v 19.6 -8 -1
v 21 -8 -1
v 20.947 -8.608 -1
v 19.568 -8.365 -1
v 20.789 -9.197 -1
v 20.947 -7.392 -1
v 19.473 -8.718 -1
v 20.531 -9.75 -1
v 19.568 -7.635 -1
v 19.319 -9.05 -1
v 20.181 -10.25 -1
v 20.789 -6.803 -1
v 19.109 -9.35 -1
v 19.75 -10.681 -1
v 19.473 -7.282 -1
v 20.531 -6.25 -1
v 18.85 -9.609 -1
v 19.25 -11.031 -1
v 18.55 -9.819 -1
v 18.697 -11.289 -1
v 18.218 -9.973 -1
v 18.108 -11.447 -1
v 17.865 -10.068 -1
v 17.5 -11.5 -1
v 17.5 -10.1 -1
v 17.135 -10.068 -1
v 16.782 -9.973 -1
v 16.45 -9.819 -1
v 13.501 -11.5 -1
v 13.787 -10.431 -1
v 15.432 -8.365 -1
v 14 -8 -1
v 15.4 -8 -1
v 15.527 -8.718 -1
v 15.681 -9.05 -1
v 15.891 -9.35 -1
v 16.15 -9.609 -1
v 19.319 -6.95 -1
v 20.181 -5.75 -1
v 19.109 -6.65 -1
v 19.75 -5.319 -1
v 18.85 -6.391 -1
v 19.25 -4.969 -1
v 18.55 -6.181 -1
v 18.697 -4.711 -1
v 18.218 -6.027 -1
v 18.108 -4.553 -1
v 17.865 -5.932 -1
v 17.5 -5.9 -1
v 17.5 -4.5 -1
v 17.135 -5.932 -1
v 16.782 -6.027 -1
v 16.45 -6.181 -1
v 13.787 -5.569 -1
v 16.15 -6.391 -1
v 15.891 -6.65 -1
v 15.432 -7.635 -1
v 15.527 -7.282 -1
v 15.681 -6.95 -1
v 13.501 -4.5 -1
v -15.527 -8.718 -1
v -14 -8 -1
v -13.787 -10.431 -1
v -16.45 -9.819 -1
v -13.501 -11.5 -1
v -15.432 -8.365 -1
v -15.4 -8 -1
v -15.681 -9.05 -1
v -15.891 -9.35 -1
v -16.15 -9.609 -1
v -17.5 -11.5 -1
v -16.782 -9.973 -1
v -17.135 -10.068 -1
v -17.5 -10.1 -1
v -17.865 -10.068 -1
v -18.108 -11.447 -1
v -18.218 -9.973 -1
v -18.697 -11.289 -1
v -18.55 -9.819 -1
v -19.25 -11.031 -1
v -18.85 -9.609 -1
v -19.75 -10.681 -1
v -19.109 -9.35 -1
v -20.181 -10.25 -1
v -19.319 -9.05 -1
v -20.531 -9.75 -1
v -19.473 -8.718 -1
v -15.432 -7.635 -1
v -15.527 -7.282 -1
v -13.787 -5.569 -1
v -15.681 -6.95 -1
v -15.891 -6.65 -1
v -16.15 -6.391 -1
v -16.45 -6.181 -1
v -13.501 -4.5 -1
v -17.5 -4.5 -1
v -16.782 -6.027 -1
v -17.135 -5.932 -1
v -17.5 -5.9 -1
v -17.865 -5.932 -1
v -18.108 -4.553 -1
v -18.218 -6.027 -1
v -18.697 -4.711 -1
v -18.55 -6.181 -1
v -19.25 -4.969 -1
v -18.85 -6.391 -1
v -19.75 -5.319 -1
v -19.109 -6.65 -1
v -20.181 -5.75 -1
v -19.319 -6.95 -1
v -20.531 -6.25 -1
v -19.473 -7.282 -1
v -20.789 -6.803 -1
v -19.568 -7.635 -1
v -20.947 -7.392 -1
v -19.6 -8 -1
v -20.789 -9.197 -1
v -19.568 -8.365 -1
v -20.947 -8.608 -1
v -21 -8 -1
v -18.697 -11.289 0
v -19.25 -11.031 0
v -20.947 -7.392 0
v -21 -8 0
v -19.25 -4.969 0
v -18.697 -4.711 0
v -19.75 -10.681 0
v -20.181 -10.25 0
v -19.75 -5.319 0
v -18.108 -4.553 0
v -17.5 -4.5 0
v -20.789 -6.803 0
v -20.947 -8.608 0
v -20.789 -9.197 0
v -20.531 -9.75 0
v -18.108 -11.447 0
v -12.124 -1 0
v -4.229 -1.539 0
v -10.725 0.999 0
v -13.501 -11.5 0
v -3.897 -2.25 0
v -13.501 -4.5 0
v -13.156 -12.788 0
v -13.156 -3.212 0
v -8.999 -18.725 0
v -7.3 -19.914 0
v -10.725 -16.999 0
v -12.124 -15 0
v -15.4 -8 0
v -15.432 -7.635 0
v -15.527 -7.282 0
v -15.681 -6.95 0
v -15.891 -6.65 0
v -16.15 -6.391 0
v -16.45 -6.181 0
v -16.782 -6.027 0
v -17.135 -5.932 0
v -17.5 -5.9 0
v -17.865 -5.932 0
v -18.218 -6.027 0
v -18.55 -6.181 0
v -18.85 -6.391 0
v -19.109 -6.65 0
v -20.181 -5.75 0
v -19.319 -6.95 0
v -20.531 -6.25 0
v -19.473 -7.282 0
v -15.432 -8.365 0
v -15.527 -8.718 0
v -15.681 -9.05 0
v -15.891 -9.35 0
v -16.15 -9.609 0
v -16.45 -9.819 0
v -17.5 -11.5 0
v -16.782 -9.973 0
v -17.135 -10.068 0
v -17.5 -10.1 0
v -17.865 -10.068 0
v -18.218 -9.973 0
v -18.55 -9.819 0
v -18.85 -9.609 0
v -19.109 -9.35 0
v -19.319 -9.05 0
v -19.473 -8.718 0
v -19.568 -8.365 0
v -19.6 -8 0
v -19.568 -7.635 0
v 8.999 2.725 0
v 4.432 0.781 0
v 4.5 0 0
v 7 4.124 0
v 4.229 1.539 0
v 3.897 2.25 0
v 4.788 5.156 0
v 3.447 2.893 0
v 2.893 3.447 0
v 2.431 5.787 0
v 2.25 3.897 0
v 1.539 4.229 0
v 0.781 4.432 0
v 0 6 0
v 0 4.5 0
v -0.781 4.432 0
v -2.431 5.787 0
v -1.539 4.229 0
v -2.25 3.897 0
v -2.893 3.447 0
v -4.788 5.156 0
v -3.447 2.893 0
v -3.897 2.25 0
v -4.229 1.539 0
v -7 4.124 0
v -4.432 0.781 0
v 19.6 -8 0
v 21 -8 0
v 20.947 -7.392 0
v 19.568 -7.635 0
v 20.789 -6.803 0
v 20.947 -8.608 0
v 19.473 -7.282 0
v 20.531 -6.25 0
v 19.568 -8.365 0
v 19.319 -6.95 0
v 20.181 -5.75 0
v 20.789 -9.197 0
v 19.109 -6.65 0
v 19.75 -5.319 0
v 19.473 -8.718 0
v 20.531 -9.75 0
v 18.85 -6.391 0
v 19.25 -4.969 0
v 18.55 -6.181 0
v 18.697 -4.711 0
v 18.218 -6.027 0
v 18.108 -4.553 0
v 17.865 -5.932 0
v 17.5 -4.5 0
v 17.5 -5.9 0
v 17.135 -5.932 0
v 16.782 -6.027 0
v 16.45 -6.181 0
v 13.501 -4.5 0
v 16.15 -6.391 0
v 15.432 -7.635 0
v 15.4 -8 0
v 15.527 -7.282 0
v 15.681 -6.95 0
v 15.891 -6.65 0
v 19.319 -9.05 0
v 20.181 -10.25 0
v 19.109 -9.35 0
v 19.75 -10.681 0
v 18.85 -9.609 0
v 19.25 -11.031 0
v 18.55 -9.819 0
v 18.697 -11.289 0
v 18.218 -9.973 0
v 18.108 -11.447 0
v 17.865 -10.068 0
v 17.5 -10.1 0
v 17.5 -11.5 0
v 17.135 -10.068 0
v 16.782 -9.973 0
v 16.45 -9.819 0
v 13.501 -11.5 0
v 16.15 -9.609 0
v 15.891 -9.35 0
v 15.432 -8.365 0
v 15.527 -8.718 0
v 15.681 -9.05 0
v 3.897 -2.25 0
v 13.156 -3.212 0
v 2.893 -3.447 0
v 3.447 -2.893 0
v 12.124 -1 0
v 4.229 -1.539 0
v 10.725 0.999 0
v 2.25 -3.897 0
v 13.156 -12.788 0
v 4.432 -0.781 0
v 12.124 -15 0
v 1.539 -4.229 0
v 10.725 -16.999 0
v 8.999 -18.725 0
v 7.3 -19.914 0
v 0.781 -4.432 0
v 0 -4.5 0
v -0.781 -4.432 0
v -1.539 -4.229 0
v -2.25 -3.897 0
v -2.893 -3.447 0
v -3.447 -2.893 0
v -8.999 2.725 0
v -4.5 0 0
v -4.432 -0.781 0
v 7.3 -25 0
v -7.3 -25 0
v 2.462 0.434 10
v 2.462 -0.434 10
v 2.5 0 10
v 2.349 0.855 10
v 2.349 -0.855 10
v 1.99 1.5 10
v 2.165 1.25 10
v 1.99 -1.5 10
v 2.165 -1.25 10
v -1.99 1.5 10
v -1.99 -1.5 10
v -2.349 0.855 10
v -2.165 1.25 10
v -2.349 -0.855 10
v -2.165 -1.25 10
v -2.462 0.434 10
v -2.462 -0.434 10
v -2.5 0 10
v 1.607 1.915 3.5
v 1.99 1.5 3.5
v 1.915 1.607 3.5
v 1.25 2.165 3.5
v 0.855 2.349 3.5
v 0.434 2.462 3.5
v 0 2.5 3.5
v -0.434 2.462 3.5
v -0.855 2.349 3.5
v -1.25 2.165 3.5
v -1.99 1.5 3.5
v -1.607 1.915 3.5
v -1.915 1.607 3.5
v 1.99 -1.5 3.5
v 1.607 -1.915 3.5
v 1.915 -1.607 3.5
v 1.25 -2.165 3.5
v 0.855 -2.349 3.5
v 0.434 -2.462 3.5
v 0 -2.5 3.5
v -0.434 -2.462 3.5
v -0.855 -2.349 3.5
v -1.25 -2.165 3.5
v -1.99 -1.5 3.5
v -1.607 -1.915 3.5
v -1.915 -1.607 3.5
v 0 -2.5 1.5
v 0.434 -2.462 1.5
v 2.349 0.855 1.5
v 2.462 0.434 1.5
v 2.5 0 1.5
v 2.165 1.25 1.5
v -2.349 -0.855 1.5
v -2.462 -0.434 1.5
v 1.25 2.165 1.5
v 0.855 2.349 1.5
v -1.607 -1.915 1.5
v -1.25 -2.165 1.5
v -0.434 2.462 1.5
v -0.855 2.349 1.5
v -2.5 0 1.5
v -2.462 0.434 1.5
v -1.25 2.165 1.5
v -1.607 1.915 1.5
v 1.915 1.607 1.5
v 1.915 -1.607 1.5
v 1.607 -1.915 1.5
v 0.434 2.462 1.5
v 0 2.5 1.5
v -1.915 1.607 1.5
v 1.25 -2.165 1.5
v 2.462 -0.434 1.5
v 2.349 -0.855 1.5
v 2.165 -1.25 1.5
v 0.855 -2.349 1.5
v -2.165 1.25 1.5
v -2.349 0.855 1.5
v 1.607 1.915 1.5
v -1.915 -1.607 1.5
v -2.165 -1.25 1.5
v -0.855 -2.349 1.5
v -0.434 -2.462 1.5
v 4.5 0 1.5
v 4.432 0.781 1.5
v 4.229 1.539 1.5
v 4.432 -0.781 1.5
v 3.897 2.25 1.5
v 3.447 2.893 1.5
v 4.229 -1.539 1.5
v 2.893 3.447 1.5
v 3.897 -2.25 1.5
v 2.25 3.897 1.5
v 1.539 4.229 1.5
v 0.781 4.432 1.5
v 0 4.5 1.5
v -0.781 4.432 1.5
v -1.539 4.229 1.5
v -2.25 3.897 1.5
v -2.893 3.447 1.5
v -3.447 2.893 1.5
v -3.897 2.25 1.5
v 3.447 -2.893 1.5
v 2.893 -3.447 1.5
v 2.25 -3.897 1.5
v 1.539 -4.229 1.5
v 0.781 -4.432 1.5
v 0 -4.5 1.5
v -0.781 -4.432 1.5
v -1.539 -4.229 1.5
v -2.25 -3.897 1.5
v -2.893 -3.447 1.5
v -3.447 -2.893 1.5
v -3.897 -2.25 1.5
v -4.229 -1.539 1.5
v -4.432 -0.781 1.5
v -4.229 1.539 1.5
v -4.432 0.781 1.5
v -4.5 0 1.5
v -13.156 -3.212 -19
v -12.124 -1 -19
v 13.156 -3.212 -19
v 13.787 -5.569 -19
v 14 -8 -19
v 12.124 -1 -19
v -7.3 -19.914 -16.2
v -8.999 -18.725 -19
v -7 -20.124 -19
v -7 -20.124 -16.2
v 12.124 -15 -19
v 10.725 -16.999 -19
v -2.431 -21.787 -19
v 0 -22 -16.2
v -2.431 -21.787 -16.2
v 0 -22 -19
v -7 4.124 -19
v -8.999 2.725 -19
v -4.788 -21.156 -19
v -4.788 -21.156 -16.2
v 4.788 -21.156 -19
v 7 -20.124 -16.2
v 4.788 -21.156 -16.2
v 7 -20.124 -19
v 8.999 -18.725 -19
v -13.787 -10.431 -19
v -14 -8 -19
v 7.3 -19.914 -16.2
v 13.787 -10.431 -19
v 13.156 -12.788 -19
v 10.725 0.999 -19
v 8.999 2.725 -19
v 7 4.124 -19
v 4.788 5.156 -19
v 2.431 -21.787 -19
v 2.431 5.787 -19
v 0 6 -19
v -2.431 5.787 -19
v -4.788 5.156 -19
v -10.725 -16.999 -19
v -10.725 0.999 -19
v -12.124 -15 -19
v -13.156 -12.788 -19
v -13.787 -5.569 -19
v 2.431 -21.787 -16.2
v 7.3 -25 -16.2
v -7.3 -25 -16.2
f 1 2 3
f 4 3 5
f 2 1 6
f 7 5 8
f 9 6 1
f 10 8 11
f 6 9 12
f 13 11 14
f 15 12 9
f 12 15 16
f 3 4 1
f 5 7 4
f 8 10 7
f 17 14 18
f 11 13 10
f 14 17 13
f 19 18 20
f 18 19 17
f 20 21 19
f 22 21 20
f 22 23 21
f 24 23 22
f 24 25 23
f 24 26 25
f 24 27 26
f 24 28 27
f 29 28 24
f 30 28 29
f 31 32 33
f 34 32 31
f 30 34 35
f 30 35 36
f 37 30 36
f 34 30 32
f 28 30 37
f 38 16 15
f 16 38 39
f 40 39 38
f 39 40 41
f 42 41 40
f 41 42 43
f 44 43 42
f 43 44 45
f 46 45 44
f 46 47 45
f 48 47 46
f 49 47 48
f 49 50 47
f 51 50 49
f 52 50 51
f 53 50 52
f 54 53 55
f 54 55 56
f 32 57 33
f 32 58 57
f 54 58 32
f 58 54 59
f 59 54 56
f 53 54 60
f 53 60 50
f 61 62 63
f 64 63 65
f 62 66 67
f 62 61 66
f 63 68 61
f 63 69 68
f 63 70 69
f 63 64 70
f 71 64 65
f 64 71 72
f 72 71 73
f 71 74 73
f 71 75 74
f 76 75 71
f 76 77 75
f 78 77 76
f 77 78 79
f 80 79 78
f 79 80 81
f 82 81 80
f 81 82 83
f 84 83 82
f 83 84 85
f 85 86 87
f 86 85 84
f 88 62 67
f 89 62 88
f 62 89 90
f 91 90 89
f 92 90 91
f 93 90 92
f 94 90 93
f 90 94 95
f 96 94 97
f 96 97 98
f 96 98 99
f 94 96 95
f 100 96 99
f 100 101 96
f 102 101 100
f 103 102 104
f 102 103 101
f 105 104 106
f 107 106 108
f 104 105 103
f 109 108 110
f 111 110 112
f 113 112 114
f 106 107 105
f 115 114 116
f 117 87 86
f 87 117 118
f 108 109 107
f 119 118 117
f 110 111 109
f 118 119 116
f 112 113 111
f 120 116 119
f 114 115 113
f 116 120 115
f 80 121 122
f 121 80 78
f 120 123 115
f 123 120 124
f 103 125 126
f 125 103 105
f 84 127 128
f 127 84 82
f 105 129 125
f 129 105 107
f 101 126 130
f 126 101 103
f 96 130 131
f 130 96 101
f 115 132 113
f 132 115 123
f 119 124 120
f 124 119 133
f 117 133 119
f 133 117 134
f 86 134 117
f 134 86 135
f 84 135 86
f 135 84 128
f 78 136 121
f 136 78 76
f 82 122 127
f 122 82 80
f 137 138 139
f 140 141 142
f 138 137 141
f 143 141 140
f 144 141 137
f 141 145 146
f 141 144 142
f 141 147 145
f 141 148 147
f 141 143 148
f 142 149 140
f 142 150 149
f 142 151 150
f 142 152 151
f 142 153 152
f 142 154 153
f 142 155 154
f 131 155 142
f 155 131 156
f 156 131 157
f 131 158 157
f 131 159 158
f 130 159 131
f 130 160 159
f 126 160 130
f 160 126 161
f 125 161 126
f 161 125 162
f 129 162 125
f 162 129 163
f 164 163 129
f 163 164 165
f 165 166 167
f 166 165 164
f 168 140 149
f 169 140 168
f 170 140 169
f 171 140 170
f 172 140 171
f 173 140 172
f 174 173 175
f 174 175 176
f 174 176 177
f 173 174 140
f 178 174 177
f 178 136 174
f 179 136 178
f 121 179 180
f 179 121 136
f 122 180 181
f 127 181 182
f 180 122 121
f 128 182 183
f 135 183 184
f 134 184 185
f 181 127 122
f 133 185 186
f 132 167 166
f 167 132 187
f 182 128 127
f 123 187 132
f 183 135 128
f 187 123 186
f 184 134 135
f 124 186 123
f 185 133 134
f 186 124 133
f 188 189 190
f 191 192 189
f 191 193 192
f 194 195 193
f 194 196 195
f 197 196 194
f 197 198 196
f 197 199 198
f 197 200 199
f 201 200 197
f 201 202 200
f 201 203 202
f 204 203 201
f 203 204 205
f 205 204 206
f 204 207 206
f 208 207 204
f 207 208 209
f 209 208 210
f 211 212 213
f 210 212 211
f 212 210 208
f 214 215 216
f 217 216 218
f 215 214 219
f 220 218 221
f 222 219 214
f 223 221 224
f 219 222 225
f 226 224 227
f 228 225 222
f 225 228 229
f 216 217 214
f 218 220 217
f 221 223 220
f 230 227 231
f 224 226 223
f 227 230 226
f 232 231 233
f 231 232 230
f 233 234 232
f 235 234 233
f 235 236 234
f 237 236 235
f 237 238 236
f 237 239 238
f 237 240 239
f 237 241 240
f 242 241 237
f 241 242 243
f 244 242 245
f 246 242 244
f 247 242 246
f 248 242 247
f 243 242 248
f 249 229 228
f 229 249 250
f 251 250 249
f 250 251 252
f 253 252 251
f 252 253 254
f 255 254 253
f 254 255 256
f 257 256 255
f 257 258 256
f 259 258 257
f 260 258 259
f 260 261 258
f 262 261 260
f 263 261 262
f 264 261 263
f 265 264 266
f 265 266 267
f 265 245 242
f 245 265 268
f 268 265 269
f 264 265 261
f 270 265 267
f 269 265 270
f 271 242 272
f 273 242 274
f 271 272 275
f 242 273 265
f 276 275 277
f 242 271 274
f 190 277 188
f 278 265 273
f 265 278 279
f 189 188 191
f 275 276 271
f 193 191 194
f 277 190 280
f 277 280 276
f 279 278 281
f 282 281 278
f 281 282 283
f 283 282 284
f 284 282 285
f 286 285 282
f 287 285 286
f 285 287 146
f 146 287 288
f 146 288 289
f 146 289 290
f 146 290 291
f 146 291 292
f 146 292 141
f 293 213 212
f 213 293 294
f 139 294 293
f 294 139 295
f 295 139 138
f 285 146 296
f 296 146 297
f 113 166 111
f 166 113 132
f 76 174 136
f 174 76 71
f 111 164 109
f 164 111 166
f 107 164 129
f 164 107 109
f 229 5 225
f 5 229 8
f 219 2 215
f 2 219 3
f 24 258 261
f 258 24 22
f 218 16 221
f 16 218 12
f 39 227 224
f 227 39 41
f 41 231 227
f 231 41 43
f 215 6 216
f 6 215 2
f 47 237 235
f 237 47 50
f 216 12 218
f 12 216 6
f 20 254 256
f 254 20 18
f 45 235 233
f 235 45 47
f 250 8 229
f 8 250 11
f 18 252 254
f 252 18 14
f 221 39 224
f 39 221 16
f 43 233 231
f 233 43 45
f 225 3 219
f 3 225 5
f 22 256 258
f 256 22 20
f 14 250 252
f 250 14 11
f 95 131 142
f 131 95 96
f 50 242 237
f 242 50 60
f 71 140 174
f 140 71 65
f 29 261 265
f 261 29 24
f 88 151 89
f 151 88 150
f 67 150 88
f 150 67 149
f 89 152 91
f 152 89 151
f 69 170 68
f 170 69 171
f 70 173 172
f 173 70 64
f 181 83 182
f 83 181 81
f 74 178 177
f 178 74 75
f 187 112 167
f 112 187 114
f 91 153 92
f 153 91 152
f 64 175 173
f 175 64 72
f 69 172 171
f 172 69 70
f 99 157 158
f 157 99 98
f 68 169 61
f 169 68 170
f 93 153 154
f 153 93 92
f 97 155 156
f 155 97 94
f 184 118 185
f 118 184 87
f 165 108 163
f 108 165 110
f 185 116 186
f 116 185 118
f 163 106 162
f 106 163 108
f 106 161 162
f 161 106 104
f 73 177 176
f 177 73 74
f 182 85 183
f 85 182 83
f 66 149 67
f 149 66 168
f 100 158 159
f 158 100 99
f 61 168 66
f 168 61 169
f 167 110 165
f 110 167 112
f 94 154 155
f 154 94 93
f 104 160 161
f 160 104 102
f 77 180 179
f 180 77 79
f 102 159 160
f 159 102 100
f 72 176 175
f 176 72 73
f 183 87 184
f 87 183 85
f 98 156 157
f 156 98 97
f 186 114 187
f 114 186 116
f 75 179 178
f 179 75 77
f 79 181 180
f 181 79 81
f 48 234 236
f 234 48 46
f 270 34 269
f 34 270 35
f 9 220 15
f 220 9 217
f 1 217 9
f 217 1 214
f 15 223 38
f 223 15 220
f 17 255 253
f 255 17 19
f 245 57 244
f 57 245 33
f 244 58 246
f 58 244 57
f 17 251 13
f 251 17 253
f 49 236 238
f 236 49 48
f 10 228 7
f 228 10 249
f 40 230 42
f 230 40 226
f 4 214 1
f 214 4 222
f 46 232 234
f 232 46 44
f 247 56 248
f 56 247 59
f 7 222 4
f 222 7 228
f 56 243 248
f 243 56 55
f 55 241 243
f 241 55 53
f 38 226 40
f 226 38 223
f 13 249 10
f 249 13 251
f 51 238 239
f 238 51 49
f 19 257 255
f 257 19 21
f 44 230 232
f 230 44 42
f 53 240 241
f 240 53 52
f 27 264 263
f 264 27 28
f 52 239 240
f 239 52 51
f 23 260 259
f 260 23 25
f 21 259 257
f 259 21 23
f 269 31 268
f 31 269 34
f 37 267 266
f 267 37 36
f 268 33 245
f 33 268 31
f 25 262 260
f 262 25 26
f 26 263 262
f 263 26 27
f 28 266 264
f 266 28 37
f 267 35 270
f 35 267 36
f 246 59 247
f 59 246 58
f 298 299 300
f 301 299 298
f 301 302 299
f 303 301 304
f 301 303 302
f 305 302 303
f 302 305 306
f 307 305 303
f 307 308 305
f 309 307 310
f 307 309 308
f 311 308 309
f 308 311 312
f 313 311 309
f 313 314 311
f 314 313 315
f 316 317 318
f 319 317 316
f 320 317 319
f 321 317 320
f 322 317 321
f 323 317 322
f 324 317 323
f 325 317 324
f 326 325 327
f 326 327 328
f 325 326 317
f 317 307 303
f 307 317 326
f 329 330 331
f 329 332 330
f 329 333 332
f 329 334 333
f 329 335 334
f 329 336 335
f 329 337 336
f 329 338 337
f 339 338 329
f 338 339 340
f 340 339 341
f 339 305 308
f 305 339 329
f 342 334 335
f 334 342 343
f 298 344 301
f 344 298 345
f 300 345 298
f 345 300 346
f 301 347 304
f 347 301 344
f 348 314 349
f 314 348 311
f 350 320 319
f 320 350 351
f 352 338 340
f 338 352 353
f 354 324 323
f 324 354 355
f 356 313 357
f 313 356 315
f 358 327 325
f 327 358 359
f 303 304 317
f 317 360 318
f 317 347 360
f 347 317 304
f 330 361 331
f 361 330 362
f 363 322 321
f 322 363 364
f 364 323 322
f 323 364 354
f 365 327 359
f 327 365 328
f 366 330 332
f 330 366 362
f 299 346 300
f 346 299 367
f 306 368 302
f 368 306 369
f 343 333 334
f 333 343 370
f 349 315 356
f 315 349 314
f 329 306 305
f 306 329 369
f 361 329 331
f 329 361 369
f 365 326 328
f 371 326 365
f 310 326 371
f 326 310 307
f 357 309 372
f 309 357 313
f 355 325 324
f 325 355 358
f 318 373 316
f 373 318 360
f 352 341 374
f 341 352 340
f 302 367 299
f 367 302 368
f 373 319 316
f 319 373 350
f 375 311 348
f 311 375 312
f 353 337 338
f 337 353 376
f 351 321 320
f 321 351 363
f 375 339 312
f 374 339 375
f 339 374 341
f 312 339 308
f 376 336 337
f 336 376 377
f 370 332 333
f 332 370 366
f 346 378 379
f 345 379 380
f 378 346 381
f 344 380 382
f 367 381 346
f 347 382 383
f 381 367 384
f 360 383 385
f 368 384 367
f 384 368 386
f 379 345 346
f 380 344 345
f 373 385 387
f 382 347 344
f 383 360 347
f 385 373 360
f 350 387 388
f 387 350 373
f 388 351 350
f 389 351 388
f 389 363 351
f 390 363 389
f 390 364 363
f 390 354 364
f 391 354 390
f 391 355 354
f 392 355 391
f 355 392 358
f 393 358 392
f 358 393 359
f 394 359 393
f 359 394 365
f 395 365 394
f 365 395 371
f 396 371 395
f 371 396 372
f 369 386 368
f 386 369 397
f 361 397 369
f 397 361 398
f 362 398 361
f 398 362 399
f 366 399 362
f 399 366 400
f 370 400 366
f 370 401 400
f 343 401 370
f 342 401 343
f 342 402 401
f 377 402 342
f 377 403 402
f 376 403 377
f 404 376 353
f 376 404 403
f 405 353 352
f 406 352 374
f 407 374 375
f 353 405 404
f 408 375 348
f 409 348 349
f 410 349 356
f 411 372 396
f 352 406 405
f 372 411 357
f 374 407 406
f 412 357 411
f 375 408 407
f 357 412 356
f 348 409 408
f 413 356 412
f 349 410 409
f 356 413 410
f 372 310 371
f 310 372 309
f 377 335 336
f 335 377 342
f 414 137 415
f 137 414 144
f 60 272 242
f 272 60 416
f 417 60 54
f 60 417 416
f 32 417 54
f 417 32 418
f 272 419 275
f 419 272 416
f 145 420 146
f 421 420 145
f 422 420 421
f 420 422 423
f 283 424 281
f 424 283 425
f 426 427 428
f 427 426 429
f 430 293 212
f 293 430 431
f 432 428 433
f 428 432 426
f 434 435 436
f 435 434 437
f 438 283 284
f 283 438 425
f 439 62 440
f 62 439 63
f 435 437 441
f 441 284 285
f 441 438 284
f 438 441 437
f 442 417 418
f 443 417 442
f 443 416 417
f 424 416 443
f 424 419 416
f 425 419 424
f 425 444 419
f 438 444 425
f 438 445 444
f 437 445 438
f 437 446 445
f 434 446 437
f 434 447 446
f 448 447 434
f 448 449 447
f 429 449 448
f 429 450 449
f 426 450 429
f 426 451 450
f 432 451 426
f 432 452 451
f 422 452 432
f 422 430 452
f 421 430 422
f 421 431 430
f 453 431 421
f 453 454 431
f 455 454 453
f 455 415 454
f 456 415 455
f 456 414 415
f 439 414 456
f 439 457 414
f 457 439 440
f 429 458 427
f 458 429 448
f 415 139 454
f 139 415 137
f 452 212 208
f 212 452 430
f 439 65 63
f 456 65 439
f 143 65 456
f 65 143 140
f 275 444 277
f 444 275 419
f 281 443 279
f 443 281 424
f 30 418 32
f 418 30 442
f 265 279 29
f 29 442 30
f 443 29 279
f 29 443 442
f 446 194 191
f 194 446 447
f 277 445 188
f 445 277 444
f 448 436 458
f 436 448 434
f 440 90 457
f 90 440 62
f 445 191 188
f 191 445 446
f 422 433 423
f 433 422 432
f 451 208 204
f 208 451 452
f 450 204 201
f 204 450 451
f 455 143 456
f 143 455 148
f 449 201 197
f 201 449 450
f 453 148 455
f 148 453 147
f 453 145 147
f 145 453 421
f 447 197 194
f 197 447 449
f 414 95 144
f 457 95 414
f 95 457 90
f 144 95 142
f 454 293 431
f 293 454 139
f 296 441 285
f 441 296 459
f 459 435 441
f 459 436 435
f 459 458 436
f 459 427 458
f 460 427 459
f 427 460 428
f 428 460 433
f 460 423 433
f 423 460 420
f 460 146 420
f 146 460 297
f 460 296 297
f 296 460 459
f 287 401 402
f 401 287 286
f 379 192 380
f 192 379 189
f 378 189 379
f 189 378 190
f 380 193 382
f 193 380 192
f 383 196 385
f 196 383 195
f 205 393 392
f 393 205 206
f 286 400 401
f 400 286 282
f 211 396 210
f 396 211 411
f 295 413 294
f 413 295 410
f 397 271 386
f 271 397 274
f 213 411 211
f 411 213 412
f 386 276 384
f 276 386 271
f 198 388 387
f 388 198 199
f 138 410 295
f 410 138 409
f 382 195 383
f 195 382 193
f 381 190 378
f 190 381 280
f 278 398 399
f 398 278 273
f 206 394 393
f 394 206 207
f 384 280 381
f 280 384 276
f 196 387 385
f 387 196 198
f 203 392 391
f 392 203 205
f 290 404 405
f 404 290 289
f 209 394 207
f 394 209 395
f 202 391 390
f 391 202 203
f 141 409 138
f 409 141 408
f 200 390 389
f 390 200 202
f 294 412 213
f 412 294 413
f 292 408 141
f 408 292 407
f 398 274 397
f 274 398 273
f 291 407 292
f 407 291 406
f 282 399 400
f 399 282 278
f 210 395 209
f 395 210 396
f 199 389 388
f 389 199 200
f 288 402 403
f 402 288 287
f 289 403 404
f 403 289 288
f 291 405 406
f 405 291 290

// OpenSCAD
module spindle_motor_775()
{
    render()
    {
        cylinder(d = 5, h = 95);
        translate([0,0,20-4.5]) {cylinder(d = 15, h = 4.5);}
        translate([0,0,20]) 
        {
            difference()
            {
                cylinder(d = 42, h = 66.5);
                for (a = [0,180])
                {
                    rotate(a)
                    {
                        translate([29/2,0,-1]) {cylinder(d = 4, h = 11);}
                    }
                }
                for (a = [0:90:270])
                {
                    rotate(a)
                    {
                        rotate(15)
                        {
                            rotate_extrude(angle = 60)
                            {
                                translate([29/2,0]) {square([4,2], center = true);} 
                            }
                            translate([0,0,5+36+5])
                            {
                                rotate_extrude(angle = 60)
                                {
                                    translate([42/2,0]) {circle(d = 4);}
                                }
                            }
                        }
                    }
                }
            }
        }
        translate([0,0,20+5]) 
        {
            linear_extrude(36)
            {
                difference()
                {
                    circle(d = 44);
                    square([3.2,44],true);
                }
            }
        }
        translate([0,0,20+66.5]) {cylinder(d = 15, h = 6.5);}
        for (a = [0,180])
        {
            rotate(a)
            {
                translate([34.5/2,-4.85/2,20+66.5]) {cube([0.6,4.85,8.9]);}
            }
        }
    }
}

module nema_17(l = 42,lower_axle_l = 0)
{
    cylinder(d = 22, h = 2);
    cylinder(d = 5, h = 24);
    if (lower_axle_l>0)
    {
        translate([0,0,-l-lower_axle_l]) {cylinder(d = 5, h = lower_axle_l+1);}
    }
    translate([0,0,-l])
    {
        linear_extrude(l)
        {
            difference()
            {
                intersection()
                {
                    square(42.3*[1,1], center = true);
                    rotate(45)
                    {
                        square((sqrt(2)*31+9)*[1,1], center = true);
                    }
                }
                for (x = 31/2*[-1,1])
                {
                    for (y = 31/2*[-1,1])
                    {
                        translate([x,y]) {circle(d = 3);}
                    }
                }
            }
        }
    }
}

module 28byj48_step_motor_axle()
{
    difference() {
        cylinder(h=8.5,d=5);
        for (a=[0,180]) {
            rotate(a=a) {
                translate([-2.5,1.5,2]) {
                    cube([5,1,6.5]);
                }
            }
        }
    }
}

module 28byj48_step_motor() {
    color("gray")
    {
        render()
        {
            translate([0,-8,-19]) {cylinder(h=19,d=28);}
            translate([-7.3,-17-8,-16.2]) {
                cube([14.6,17,16.2]);
            }
            translate([0,-8,-0.5]) {
                #difference() {
                    union() {
                        cube([35,7,1],true);
                        for (i=[-1,1]) {
                            translate([i*35/2,0,0]) {
                                cylinder(h=1,d=7,center = true);
                            }
                        }
                    }
                    for (i=[-1,1]) {
                        translate([i*35/2,0,0]) {
                            cylinder(h=1,d=4.2,center = true);
                        }
                    }
                }
            }
            cylinder(h=1.5,d=9);
            translate([0,0,1.5]) {28byj48_step_motor_axle();}
        }
    }
}

28byj48_step_motor($fn = 36);

module mst_motor_coupling(D1 = 5, D2 = 8, A = 20, W = 25, F = 3, M = 3, L = 7.5)
{
    render()
    {
        difference()
        {
            union()
            {
                linear_extrude(L) {difference() {circle(d = A);circle(d = D1);}}
                translate([0,0,L]) linear_extrude(W-2*L) {difference() {circle(d = A);circle(d = 2*A/3);}}
                translate([0,0,W-L]) linear_extrude(L) {difference() {circle(d = A);circle(d = D2);}}
            }
            for (z = [F,W-F], a = [0,90])
            {
                rotate(a) {translate([0,0,z]) {rotate(90,[1,0,0]) {cylinder(d = M, h = A);}}}
            }
            dz = (W-2*L)/17;
            for (i = [0:8])
            {
                rotate(i * 90) {translate([-A/2,-A/4,2*i*dz+L]) {cube([A,A,dz]);}}
            }
        }
    }
}

*mst_motor_coupling($fn = 36);
